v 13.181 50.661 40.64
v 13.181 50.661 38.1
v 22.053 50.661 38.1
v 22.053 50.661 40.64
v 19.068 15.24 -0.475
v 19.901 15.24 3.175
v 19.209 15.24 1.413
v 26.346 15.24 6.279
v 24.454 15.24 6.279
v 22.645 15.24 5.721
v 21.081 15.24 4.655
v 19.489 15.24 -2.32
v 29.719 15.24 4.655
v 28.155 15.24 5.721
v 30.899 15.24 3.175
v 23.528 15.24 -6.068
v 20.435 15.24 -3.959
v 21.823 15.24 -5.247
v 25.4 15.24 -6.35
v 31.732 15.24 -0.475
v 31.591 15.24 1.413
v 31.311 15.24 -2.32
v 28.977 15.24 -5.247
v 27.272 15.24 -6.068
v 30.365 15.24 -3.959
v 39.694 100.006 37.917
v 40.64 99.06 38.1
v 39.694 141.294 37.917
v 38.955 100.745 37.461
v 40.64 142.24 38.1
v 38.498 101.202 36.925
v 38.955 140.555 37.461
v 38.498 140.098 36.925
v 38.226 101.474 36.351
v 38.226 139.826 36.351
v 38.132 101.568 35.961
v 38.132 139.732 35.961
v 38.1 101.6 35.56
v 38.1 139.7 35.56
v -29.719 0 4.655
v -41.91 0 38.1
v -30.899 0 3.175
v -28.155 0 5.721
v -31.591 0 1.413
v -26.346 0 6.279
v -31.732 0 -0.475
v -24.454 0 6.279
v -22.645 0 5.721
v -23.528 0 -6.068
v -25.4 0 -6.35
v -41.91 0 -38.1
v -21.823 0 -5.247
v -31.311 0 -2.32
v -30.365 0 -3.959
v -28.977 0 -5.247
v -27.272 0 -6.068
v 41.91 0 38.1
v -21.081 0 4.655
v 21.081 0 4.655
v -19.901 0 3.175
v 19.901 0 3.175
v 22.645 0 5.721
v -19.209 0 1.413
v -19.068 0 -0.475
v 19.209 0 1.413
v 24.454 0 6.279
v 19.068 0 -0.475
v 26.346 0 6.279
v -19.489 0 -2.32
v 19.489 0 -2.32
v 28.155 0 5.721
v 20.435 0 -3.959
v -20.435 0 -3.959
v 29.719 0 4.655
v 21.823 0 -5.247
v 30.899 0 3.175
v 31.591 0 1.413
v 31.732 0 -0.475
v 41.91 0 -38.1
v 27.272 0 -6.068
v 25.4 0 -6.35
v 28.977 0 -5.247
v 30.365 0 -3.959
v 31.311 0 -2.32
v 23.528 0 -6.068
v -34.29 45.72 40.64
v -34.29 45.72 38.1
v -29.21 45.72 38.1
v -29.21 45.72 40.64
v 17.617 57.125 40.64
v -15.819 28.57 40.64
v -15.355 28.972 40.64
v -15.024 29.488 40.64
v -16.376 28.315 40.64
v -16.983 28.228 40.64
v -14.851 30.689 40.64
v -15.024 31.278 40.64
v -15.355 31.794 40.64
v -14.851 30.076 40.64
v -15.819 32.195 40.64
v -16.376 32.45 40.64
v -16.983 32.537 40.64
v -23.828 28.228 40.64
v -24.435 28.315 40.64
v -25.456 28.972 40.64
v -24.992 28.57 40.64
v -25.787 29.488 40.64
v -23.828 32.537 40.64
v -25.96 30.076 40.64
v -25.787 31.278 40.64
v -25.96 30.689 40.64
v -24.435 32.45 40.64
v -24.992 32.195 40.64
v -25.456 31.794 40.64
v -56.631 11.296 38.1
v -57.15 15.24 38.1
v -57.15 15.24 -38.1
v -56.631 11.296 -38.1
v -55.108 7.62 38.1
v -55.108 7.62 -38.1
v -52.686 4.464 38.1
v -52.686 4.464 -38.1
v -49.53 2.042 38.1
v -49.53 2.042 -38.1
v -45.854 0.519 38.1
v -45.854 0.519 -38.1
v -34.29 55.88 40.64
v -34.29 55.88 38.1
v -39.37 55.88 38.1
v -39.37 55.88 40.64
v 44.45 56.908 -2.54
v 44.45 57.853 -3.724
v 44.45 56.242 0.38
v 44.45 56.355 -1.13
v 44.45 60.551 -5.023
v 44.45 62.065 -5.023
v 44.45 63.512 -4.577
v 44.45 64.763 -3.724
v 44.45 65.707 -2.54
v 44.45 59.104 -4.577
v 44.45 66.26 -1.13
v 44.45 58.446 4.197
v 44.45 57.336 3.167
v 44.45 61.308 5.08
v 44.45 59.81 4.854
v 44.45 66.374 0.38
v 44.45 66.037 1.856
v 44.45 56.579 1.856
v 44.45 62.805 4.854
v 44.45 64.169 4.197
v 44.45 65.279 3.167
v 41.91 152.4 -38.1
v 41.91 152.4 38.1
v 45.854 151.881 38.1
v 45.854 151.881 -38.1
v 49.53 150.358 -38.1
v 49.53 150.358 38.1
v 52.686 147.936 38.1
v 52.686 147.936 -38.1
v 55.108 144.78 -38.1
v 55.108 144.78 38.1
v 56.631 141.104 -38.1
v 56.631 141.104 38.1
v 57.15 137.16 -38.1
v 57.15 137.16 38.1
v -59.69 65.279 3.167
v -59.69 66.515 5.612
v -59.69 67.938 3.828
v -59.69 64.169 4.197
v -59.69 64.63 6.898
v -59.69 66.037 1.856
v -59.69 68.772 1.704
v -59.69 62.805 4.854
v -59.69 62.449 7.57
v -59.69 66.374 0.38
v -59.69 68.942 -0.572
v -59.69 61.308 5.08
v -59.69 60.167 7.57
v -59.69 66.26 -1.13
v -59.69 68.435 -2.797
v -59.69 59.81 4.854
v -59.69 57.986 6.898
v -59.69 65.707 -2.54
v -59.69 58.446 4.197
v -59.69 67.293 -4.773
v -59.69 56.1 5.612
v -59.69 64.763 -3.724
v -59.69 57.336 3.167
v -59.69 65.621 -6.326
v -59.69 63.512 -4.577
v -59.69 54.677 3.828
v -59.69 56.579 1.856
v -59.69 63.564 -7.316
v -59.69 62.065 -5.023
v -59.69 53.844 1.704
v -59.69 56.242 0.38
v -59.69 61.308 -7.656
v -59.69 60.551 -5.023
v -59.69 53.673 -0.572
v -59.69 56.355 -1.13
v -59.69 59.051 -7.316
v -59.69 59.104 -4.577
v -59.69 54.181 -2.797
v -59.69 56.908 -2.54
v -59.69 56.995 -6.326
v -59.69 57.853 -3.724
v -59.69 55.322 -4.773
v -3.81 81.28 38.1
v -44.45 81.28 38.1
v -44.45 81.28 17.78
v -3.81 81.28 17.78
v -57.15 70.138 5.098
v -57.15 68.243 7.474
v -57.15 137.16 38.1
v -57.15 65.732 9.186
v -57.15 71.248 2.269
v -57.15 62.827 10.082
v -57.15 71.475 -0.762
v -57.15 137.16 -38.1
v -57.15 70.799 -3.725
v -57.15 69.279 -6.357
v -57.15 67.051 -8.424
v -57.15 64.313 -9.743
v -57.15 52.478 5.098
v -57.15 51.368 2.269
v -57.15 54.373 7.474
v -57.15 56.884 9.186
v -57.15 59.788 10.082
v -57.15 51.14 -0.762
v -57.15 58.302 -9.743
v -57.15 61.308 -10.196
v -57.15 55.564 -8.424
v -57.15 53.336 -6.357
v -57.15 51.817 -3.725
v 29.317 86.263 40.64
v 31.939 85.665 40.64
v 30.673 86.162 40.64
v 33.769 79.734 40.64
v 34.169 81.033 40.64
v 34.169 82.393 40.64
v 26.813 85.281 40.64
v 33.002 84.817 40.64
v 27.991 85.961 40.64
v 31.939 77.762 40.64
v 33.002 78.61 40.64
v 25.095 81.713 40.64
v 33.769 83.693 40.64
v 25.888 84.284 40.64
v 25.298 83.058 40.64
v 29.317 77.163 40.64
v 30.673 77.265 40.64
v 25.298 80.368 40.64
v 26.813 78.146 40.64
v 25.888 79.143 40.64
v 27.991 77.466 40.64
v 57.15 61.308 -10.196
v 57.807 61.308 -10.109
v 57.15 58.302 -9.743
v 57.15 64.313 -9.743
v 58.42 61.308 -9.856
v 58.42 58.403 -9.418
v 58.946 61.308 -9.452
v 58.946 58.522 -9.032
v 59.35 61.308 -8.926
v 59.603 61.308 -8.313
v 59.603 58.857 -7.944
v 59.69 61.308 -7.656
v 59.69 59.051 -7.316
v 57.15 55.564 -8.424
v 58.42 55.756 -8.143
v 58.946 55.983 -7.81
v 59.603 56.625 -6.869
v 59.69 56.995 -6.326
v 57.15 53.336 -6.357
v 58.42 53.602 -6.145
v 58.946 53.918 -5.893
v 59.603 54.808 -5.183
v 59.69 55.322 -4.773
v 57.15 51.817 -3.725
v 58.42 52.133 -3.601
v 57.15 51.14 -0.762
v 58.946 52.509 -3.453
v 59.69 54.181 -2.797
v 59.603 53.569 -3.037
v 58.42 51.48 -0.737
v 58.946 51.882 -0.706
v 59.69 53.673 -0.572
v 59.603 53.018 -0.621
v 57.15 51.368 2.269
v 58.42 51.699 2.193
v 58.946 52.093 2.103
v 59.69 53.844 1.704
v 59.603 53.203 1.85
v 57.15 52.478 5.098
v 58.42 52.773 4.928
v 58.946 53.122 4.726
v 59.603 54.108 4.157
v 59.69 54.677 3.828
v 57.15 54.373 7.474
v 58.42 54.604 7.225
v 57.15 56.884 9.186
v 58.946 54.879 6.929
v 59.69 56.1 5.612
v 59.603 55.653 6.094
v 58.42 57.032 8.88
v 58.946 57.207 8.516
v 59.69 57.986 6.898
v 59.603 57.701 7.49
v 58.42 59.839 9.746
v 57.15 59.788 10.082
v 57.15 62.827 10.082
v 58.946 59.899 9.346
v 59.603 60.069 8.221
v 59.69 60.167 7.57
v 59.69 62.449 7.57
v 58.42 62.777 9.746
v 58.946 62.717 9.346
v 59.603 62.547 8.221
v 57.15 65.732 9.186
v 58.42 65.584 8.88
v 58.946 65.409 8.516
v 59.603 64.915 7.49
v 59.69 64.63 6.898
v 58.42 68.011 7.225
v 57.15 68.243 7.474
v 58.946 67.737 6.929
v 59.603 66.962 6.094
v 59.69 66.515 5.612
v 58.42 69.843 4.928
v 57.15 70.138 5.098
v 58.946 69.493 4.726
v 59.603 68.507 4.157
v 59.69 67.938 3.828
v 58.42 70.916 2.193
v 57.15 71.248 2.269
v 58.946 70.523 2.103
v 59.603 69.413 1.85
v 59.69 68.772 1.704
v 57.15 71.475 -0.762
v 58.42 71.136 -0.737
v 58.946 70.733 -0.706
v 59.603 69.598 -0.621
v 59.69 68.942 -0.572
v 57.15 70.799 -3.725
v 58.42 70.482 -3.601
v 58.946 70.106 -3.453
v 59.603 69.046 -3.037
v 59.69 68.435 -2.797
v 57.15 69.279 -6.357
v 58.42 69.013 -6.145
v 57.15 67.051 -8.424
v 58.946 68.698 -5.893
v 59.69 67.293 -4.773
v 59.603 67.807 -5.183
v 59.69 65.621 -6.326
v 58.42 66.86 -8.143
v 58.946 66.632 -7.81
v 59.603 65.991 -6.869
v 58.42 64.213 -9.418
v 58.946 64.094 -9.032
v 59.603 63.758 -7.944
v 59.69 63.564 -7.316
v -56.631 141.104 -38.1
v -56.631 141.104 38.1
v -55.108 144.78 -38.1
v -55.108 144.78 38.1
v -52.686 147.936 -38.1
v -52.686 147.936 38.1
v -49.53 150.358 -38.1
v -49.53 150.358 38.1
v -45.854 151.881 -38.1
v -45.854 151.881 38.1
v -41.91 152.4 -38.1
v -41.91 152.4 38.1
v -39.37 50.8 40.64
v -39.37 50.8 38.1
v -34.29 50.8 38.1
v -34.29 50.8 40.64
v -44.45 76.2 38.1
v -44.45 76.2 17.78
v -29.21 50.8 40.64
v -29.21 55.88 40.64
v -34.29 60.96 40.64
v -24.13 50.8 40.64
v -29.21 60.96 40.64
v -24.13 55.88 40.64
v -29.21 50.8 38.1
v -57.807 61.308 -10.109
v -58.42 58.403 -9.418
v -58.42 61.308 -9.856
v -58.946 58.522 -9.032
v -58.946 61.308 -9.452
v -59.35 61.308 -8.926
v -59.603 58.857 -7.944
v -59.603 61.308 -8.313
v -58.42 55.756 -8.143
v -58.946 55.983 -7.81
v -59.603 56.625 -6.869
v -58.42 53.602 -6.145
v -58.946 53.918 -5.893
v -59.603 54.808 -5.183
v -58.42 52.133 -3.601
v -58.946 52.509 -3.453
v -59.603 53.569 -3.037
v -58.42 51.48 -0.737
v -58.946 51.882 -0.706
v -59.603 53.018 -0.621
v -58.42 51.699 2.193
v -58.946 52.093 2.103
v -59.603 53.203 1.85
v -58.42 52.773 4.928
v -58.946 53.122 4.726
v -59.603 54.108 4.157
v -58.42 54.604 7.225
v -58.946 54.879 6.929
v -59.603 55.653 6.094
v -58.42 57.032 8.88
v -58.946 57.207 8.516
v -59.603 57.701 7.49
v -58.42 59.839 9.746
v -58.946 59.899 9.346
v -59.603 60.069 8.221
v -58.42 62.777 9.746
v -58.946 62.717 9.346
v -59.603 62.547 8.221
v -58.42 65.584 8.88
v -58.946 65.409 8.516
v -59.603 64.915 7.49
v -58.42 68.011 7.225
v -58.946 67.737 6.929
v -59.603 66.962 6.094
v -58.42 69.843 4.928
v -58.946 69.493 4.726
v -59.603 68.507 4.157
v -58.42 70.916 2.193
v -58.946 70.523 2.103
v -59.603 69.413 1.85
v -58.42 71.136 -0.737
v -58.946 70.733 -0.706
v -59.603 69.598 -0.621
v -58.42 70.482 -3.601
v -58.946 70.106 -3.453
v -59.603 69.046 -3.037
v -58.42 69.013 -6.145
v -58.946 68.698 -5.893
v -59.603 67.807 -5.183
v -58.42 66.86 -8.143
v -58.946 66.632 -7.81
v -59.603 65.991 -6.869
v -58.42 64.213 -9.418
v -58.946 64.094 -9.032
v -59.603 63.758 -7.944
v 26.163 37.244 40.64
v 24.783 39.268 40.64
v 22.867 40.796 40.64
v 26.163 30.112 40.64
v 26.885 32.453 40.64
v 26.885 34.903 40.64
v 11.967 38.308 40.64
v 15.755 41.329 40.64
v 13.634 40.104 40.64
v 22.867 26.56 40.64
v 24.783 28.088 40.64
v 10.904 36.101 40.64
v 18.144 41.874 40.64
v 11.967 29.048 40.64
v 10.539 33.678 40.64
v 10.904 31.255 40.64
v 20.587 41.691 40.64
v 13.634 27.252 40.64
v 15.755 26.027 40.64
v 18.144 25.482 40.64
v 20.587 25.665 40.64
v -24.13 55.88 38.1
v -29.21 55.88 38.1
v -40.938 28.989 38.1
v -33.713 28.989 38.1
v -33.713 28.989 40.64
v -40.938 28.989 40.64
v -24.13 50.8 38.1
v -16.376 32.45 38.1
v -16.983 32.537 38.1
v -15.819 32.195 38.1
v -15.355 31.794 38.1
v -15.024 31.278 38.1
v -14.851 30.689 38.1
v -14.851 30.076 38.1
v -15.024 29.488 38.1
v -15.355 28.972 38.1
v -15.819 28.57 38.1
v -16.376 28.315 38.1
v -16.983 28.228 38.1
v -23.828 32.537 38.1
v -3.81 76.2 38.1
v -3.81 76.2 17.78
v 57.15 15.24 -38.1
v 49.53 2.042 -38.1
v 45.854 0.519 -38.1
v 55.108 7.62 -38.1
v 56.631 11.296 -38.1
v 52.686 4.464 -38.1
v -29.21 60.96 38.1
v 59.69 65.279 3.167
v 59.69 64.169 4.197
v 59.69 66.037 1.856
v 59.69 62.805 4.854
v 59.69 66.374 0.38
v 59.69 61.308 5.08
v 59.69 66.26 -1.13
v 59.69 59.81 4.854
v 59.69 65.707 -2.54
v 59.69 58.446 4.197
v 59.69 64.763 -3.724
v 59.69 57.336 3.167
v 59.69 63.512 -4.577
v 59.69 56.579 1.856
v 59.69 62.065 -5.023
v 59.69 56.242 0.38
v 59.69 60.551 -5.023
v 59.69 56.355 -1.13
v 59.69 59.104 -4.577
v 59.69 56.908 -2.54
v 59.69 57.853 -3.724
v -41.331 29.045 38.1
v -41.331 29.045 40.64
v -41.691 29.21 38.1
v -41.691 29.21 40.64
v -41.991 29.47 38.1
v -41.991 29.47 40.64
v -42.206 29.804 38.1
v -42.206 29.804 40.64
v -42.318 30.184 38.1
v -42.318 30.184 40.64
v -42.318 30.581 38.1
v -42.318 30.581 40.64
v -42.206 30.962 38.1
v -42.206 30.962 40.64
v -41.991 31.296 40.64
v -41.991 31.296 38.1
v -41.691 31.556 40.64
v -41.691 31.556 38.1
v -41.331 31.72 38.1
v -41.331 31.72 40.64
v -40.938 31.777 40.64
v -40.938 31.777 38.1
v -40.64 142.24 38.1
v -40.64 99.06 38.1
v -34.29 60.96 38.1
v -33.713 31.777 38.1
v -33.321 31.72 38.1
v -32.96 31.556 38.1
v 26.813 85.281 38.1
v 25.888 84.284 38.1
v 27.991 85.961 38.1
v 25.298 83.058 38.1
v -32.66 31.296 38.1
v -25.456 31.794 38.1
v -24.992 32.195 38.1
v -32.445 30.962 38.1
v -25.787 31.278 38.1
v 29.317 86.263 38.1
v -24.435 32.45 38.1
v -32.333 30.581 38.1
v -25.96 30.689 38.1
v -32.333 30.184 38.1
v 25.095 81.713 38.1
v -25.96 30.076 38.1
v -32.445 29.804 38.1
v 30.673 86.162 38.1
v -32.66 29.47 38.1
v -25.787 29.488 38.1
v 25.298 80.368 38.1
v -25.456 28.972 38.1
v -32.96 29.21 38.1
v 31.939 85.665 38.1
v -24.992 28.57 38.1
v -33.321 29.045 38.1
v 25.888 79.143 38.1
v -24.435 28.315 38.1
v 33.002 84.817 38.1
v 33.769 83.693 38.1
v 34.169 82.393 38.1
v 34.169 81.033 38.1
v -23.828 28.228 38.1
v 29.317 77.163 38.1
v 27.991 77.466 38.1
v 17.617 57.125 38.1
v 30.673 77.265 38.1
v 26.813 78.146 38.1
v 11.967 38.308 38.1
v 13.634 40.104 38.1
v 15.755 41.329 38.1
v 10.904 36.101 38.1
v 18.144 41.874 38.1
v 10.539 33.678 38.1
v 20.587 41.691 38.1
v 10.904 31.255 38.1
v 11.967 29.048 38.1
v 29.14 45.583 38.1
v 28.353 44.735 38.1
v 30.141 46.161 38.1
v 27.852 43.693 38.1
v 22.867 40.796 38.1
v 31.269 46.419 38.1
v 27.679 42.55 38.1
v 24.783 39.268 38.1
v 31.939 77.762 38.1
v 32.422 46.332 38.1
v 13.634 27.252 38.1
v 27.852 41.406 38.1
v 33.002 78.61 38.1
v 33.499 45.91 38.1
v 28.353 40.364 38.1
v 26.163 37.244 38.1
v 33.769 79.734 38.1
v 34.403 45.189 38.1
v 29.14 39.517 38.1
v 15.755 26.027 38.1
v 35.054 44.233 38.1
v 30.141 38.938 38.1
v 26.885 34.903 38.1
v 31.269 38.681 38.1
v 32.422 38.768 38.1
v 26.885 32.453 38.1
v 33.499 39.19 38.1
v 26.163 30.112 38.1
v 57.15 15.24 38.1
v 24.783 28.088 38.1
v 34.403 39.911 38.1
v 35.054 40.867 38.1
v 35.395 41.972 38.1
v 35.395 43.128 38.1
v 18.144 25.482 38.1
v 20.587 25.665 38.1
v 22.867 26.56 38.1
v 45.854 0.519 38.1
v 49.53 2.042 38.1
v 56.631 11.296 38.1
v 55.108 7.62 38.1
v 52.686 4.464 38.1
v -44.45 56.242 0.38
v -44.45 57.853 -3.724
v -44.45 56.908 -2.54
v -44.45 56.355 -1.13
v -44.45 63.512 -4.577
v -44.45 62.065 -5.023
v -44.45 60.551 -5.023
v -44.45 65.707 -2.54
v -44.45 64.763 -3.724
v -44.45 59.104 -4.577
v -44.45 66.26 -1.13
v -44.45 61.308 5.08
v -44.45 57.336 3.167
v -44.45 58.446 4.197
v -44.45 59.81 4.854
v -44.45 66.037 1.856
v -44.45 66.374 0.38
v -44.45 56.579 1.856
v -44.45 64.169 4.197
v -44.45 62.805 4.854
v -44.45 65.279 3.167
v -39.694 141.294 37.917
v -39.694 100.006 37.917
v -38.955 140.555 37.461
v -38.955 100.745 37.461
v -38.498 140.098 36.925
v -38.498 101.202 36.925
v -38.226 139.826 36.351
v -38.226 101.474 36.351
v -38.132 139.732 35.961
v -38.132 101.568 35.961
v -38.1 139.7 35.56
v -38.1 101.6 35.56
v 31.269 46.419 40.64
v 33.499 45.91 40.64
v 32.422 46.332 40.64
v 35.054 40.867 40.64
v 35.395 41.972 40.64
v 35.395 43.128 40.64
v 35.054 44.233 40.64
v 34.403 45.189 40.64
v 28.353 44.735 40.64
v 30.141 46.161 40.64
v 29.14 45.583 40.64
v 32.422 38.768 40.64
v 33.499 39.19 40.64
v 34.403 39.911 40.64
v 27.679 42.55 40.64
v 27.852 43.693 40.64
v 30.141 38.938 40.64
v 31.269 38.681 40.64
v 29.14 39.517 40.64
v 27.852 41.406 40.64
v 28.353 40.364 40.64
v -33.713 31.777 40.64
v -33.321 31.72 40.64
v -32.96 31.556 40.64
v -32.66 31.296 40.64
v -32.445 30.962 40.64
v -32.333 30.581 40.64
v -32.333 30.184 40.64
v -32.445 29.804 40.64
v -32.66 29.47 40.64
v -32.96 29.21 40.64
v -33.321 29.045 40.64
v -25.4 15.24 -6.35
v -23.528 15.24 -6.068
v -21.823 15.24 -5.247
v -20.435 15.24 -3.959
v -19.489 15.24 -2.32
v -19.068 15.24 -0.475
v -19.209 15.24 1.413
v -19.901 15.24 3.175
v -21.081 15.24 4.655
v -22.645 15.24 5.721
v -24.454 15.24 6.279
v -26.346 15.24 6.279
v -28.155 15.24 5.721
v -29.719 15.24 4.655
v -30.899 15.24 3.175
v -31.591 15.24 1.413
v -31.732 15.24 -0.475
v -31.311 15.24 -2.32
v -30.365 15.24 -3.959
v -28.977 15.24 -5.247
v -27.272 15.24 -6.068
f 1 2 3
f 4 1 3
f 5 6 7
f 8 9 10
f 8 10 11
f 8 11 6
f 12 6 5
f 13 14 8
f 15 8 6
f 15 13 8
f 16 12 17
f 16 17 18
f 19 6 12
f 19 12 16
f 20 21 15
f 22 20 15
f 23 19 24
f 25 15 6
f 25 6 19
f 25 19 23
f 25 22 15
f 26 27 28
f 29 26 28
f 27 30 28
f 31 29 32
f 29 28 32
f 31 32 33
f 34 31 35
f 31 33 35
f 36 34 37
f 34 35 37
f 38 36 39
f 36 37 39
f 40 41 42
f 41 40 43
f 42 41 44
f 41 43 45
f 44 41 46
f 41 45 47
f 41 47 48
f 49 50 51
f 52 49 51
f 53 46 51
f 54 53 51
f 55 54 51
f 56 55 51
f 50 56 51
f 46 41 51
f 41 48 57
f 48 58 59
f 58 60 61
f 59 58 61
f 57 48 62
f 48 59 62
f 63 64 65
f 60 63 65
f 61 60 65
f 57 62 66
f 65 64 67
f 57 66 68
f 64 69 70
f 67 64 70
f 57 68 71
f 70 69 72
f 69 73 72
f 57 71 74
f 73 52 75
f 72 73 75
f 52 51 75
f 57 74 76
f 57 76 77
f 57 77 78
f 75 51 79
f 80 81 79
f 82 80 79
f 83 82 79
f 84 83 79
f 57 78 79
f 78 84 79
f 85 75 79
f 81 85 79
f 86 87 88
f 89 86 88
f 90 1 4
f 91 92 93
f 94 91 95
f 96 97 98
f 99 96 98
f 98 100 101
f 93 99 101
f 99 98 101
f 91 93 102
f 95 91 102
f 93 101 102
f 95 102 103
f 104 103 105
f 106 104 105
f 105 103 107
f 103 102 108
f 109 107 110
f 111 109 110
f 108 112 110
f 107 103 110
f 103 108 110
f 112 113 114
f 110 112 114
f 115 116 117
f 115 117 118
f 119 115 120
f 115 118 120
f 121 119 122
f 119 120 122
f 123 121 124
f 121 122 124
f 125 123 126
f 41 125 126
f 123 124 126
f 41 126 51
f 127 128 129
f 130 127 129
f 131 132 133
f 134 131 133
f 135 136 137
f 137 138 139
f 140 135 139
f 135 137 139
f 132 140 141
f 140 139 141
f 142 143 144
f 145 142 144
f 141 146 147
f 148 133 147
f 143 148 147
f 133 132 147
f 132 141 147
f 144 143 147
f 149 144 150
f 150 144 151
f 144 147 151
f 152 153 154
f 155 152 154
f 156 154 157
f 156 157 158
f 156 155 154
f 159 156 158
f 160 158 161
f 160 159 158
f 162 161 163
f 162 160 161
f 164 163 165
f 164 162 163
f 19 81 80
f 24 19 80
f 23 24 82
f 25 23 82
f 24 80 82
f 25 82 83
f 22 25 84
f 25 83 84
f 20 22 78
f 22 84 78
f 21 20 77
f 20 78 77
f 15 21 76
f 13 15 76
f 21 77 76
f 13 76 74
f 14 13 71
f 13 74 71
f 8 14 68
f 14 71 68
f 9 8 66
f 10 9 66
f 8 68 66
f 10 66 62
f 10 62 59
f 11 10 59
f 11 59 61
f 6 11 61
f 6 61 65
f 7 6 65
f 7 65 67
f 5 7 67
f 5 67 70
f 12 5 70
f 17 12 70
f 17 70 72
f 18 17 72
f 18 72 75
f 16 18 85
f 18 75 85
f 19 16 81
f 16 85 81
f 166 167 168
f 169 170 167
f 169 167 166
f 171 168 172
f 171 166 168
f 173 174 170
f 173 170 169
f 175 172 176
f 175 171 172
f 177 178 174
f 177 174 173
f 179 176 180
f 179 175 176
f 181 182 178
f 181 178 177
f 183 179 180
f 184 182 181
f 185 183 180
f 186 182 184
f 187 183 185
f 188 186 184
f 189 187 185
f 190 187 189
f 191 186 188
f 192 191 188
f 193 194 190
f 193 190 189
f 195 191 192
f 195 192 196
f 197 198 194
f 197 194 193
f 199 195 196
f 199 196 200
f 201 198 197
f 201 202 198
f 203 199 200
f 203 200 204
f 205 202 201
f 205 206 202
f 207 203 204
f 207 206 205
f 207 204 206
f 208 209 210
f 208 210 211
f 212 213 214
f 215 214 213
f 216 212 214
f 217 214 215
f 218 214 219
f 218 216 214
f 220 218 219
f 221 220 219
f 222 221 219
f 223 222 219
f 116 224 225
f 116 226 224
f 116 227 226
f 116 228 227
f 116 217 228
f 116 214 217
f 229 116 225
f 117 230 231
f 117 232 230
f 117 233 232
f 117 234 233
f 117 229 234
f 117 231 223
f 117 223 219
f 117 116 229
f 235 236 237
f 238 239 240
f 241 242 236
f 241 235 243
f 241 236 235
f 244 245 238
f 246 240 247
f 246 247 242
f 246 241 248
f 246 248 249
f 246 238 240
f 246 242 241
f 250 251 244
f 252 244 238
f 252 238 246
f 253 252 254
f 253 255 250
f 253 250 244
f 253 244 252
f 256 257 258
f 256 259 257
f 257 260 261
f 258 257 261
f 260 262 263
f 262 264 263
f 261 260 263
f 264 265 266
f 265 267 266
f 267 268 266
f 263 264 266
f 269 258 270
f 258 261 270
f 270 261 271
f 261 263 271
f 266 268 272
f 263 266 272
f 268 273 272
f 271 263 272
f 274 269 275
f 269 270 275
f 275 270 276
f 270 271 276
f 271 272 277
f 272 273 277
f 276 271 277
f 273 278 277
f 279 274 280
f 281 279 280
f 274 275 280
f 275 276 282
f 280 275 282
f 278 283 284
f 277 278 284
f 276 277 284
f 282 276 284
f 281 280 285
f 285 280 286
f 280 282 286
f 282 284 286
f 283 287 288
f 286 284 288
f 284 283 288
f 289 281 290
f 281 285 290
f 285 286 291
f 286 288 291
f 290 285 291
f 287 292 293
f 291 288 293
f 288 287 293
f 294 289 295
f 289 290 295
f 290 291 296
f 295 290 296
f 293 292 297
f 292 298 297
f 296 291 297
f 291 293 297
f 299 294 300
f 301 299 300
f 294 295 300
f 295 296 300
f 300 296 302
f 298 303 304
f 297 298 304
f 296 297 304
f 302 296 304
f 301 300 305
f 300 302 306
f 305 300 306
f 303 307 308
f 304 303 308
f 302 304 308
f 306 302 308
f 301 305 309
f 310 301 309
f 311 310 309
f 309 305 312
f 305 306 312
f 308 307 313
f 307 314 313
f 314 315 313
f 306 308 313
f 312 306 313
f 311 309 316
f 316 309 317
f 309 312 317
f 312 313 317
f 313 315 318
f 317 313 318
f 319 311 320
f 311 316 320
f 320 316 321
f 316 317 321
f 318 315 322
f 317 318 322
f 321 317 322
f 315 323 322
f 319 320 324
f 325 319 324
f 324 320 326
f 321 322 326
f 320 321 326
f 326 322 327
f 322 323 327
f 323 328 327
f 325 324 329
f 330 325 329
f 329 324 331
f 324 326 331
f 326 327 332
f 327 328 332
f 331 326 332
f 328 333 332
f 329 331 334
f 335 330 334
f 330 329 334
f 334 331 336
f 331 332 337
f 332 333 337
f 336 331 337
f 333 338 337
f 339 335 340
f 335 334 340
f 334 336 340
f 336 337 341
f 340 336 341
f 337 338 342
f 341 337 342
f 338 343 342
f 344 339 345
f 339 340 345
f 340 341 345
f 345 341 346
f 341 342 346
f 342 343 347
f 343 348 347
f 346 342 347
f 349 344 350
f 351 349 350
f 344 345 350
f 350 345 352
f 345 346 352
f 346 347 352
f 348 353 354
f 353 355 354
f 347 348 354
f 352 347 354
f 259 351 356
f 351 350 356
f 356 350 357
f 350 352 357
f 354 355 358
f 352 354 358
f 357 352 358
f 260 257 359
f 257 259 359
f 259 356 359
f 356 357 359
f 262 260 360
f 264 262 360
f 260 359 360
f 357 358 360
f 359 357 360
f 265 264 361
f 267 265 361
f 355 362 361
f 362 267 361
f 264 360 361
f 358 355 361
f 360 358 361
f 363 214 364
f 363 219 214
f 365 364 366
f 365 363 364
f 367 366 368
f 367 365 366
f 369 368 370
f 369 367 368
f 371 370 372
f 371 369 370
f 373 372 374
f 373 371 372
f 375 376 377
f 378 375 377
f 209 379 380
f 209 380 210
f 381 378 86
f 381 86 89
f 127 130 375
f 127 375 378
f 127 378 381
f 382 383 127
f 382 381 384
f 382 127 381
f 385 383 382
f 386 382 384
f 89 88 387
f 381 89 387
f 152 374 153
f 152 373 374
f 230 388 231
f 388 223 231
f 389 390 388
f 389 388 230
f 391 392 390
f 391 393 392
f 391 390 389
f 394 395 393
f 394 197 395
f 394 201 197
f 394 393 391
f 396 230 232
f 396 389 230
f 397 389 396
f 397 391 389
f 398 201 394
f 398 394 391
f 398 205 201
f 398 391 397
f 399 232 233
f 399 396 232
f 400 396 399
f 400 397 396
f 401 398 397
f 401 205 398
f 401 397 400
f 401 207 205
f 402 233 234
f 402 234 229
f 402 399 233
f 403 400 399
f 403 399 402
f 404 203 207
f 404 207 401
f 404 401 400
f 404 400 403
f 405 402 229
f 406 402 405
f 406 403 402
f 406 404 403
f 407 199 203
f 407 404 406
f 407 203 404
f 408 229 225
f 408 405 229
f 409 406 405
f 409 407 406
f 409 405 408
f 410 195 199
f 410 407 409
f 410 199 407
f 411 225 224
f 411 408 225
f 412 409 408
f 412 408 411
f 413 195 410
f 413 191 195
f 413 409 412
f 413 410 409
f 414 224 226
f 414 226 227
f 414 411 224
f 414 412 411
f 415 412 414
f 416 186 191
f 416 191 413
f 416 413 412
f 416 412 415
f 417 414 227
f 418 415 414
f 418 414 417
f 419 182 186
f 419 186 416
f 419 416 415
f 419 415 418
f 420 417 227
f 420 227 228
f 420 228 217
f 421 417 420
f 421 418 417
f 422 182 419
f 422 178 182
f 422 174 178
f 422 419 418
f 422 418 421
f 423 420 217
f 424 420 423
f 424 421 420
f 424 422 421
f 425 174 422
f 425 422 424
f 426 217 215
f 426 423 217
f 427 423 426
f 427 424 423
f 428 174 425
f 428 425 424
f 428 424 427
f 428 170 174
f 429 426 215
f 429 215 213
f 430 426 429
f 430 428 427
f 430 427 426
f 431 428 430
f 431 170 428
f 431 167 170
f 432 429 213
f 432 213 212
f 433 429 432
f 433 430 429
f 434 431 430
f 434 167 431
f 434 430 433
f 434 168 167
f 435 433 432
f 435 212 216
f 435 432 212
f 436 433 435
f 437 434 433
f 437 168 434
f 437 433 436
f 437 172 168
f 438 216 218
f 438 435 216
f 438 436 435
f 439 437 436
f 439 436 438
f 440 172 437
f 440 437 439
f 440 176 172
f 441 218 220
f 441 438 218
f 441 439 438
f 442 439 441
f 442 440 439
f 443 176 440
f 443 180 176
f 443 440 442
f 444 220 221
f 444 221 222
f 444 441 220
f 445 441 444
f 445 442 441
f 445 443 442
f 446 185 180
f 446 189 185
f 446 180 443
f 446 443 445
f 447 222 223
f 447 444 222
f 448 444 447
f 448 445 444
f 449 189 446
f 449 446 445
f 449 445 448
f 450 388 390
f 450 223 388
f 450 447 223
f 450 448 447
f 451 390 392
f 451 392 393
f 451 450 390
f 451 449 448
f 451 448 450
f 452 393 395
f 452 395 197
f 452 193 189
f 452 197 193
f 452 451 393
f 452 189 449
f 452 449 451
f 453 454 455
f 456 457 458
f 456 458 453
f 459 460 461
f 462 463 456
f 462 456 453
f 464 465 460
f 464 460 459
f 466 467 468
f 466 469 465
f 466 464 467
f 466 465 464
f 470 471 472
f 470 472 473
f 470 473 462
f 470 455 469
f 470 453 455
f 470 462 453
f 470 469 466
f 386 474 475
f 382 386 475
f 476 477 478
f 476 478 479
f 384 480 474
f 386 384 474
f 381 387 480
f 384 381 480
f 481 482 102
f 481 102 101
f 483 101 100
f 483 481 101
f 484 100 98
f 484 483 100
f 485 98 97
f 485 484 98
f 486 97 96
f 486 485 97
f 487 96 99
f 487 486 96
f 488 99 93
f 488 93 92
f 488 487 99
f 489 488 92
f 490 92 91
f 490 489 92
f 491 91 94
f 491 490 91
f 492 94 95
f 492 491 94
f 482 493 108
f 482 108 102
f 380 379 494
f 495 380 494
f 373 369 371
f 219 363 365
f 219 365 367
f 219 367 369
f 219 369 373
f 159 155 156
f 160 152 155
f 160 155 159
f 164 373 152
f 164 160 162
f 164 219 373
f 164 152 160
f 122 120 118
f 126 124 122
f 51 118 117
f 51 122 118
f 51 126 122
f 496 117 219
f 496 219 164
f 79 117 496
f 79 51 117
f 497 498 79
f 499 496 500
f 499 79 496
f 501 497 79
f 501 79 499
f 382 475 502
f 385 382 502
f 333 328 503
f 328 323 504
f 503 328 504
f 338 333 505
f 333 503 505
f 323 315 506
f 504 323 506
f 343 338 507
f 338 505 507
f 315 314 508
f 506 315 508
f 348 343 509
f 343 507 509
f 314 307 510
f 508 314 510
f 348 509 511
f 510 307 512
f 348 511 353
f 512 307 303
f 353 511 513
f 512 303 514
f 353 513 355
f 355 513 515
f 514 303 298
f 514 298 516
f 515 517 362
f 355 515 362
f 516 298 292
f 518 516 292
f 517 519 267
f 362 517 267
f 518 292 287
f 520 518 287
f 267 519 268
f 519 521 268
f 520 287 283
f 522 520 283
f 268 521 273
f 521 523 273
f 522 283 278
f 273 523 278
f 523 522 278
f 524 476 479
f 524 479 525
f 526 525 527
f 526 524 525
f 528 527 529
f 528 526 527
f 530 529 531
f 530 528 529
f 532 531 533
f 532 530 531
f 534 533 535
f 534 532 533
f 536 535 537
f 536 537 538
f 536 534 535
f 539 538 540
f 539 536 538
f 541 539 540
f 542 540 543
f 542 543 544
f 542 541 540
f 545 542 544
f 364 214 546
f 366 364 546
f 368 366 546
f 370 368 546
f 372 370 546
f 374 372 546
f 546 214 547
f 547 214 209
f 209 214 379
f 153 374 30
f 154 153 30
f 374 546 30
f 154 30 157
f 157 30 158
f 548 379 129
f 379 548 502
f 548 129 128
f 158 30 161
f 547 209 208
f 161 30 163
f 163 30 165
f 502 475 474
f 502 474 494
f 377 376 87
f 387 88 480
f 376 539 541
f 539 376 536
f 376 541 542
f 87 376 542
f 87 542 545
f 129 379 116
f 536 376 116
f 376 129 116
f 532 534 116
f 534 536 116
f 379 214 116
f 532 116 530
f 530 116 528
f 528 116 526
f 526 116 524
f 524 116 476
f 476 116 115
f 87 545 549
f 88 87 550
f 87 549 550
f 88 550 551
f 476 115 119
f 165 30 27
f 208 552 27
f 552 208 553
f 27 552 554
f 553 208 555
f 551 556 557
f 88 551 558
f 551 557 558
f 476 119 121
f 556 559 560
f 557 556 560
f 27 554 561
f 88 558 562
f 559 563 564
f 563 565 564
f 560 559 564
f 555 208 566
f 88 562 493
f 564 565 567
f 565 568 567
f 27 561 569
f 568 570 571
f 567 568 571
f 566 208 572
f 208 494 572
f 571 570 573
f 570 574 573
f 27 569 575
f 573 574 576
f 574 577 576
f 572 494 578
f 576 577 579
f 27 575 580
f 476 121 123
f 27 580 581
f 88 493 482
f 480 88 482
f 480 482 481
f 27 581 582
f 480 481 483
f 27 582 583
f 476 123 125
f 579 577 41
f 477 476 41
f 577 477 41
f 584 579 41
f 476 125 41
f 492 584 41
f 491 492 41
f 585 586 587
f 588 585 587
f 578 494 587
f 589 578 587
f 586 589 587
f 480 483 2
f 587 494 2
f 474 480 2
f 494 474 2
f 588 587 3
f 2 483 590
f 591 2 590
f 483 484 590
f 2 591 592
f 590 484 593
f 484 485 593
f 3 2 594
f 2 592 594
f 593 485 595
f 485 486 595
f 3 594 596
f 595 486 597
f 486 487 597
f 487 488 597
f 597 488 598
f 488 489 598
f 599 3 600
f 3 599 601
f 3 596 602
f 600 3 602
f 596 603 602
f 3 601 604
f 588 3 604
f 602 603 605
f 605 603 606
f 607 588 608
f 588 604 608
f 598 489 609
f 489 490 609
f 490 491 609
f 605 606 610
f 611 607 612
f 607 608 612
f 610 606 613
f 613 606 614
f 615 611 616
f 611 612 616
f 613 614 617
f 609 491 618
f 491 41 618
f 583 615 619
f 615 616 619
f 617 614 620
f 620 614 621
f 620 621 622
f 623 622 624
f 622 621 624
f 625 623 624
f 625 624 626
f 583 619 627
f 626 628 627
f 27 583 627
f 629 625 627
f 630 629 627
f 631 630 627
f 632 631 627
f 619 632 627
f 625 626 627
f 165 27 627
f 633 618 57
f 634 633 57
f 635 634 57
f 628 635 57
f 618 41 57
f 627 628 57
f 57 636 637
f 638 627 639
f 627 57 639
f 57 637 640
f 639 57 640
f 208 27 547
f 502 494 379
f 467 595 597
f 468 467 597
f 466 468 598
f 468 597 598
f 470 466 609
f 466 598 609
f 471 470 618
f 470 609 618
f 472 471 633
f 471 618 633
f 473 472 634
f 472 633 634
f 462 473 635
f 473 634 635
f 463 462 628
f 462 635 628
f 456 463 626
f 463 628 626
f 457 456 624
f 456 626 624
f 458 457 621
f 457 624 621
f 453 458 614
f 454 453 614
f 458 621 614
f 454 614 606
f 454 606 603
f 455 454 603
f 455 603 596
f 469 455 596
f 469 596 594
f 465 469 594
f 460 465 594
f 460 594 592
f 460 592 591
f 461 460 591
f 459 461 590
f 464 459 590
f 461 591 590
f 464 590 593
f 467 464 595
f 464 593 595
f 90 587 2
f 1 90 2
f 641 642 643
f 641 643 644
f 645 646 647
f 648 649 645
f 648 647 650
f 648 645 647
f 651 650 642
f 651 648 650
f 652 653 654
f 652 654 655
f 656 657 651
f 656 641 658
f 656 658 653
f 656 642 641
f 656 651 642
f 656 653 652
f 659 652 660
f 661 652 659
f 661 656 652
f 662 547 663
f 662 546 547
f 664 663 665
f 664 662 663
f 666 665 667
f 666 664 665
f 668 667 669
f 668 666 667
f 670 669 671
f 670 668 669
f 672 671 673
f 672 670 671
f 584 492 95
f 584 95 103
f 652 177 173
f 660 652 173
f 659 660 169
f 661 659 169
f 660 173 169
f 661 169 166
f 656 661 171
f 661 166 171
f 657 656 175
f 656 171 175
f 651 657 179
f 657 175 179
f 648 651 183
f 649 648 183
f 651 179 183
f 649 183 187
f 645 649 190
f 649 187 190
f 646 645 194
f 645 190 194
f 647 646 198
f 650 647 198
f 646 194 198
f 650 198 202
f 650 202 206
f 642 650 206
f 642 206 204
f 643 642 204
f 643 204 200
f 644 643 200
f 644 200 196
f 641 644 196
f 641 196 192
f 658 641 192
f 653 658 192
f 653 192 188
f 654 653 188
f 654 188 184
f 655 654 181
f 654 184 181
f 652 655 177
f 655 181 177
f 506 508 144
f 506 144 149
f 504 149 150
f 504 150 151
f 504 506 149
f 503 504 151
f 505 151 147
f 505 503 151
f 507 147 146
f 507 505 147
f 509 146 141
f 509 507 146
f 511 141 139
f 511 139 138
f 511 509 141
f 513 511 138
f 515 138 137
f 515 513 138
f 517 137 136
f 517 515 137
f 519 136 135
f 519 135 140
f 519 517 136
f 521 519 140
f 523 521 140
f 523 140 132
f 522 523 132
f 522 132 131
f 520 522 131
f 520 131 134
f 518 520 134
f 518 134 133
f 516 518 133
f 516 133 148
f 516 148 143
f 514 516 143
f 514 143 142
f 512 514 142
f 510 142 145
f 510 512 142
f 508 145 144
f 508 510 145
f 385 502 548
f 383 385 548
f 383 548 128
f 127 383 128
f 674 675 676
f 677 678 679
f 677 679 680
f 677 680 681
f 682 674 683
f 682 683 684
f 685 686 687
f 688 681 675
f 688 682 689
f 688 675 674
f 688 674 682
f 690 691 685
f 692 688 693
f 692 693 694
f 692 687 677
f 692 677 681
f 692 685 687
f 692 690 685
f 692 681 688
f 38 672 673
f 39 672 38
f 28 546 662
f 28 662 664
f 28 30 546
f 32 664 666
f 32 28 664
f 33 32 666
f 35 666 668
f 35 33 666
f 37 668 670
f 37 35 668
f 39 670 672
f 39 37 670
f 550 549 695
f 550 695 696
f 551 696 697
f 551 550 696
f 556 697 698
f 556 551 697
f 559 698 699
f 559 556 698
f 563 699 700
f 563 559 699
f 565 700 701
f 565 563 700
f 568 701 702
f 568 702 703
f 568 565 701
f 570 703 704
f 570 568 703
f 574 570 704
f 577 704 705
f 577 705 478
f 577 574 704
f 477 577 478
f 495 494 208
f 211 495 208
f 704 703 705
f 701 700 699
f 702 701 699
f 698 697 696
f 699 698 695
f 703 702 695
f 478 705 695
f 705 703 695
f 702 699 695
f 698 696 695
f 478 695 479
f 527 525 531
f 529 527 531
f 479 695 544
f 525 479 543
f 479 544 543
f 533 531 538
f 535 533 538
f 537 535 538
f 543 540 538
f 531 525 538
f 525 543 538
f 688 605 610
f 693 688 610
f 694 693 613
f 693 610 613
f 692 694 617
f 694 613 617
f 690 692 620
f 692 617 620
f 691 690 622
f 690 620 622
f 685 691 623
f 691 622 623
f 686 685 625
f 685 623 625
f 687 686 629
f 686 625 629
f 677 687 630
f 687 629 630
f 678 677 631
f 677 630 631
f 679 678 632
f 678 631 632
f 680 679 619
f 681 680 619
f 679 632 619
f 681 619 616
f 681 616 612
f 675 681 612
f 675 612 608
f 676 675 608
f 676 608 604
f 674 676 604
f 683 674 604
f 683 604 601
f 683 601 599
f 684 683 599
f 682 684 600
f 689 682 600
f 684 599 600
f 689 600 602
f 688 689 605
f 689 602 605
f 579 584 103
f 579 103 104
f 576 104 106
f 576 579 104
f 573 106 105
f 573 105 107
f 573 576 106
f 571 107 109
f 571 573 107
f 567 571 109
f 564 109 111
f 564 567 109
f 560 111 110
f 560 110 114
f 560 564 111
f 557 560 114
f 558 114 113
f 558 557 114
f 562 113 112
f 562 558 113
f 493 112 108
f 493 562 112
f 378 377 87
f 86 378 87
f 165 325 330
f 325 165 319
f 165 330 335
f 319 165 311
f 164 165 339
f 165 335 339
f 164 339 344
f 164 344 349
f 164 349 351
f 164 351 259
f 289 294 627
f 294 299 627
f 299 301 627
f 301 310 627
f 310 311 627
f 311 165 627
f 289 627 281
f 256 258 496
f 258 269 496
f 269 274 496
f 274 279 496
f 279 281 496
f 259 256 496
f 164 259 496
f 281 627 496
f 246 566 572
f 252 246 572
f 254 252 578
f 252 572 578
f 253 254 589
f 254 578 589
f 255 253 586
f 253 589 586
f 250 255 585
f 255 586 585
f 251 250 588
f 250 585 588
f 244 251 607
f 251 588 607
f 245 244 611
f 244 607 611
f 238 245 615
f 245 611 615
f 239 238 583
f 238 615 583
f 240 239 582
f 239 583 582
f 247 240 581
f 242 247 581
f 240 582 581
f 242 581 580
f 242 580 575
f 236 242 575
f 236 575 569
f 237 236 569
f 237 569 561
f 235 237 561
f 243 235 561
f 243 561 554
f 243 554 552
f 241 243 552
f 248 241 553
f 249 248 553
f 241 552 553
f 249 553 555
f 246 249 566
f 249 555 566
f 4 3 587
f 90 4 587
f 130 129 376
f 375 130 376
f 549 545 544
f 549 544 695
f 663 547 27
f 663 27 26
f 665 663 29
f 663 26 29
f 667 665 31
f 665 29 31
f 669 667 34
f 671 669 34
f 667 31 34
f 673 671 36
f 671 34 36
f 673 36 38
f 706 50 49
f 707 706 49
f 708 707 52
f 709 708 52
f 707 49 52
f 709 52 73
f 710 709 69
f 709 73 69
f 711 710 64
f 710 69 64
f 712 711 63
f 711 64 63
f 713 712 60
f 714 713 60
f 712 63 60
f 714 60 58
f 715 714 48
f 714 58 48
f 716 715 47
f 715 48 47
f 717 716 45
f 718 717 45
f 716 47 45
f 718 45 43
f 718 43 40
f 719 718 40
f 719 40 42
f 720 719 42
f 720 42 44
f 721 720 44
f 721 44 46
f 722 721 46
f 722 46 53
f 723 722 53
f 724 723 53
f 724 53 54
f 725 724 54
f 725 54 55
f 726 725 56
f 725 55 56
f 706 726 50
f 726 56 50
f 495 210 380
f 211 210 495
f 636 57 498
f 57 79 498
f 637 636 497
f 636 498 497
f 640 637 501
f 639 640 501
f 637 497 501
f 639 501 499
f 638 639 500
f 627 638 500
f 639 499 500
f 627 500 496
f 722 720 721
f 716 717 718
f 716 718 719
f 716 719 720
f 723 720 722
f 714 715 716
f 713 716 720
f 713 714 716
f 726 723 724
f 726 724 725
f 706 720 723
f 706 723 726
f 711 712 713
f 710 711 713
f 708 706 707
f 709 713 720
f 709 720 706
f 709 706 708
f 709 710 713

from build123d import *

# Parameters (mm, degrees)
SKETCH2_W           = 114.3
SKETCH2_H           = 76.2
BOSS_EXTRUDE1_DEPTH = 152.4
SKETCH3_W           = 76.2
SKETCH3_H           = 38.1
CUT_EXTRUDE1_DEPTH  = 2.54
FILLET2_R           = 15.24
SKETCH4_W           = 40.64
SKETCH4_H           = 5.08
CUT_EXTRUDE2_DEPTH  = 20.32
SKETCH5_R           = 4.562719015
BOSS_EXTRUDE2_DEPTH = 2.54
SKETCH11_R          = 10.195906114
BOSS_EXTRUDE3_DEPTH = 2.54
SKETCH12_R          = 5.08
CUT_EXTRUDE8_DEPTH  = 15.24
SKETCH13_R          = 6.35
CUT_EXTRUDE9_DEPTH  = 15.24
FILLET3_R           = 2.54
FILLET4_R           = 2.54
BOSS_EXTRUDE4_DEPTH = 2.54
BOSS_EXTRUDE5_DEPTH = 2.54
SKETCH8_R           = 3.879636345
BOSS_EXTRUDE6_DEPTH = 2.54
BOSS_EXTRUDE7_DEPTH = 2.54
SKETCH9_R           = 8.218720736
BOSS_EXTRUDE8_DEPTH = 2.54


with BuildPart() as part:
    # Sketch2 → Boss-Extrude1 (new body)
    with BuildSketch(Plane(origin=(0, 0, 0), x_dir=(1, 0, 0), z_dir=(0, 1, 0))):
        Rectangle(SKETCH2_W, SKETCH2_H)
    extrude(amount=BOSS_EXTRUDE1_DEPTH)

    # Sketch3 → Cut-Extrude1 (cut)
    with BuildSketch(Plane.XY.offset(38.1)):
        with Locations((0, 120.65)):
            Rectangle(SKETCH3_W, SKETCH3_H)
    extrude(amount=-CUT_EXTRUDE1_DEPTH, mode=Mode.SUBTRACT)

    # Fillet2
    fillet2_edges = [part.edges().sort_by_distance(p)[0] for p in [
        (-57.15, 152.4, 0),
        (57.15, 152.4, 0),
        (-57.15, 0, 0),
        (57.15, 0, 0),
    ]]
    fillet(fillet2_edges, radius=FILLET2_R)

    # Sketch4 → Cut-Extrude2 (cut)
    with BuildSketch(Plane.XY.offset(38.1)):
        with Locations((-24.13, 78.74)):
            Rectangle(SKETCH4_W, SKETCH4_H)
    extrude(amount=-CUT_EXTRUDE2_DEPTH, mode=Mode.SUBTRACT)

    # Sketch5 → Boss-Extrude2 (add)
    with BuildSketch(Plane.XY.offset(38.1)):
        with Locations(Location((29.657673596, 81.713285476, 0), (0, 0, 180))):
            Circle(SKETCH5_R)
    extrude(amount=BOSS_EXTRUDE2_DEPTH)

    # Sketch11 → Boss-Extrude3 (add)
    with BuildSketch(Plane.ZY.offset(57.15)):
        with Locations(Location((0, 61.307792105, 0), (0, 0, 180))):
            Circle(SKETCH11_R)
    boss_extrude3 = extrude(amount=BOSS_EXTRUDE3_DEPTH)

    # Sketch12 → Cut-Extrude8 (cut)
    with BuildSketch(Plane.ZY.offset(59.69)):
        with Locations((0, 61.307792105)):
            Circle(SKETCH12_R)
    cut_extrude8 = extrude(amount=-CUT_EXTRUDE8_DEPTH, mode=Mode.SUBTRACT)

    # Mirror1: Boss-Extrude3, Cut-Extrude8 across plane
    add(boss_extrude3.mirror(Plane(origin=(0, 0, 0), x_dir=(0, 0, 1), z_dir=(1, 0, 0))))
    add(cut_extrude8.mirror(Plane(origin=(0, 0, 0), x_dir=(0, 0, 1), z_dir=(1, 0, 0))), mode=Mode.SUBTRACT)

    # Sketch13 → Cut-Extrude9 (cut)
    with BuildSketch(Plane.XZ):
        with Locations(Location((-25.4, 0, 0), (0, 0, 270))):
            Circle(SKETCH13_R)
        with Locations(Location((25.4, 0, 0), (0, 0, 270))):
            Circle(SKETCH13_R)
    extrude(amount=-CUT_EXTRUDE9_DEPTH, mode=Mode.SUBTRACT)

    # Fillet3
    fillet3_edges = [part.edges().sort_by_distance(p)[0] for p in [
        (-59.69, 61.307792105, 10.195906114),
        (59.69, 61.307792105, 10.195906114),
    ]]
    fillet(fillet3_edges, radius=FILLET3_R - 0.0001)  # a hair under: the kernel refuses the full size

    # Fillet4
    fillet4_edges = [part.edges().sort_by_distance(p)[0] for p in [
        (0, 101.6, 38.1),
        (-38.1, 120.65, 38.1),
        (38.1, 120.65, 38.1),
        (0, 139.7, 38.1),
    ]]
    fillet(fillet4_edges, radius=FILLET4_R - 0.0001)  # a hair under: the kernel refuses the full size

    # Sketch6 → Boss-Extrude4 (add)
    with BuildSketch(Plane.XY.offset(38.1)):
        Polygon((-34.29, 60.96), (-34.29, 55.88), (-39.37, 55.88), (-39.37, 50.8), (-34.29, 50.8), (-34.29, 45.72), (-29.21, 45.72), (-29.21, 50.8), (-24.13, 50.8), (-24.13, 55.88), (-29.21, 55.88), (-29.21, 60.96), align=None)
    extrude(amount=BOSS_EXTRUDE4_DEPTH)

    # Sketch7 → Boss-Extrude5 (add)
    with BuildSketch(Plane.XY.offset(38.1)):
        Polygon((17.617165085, 57.125299675), (13.181188265, 50.661447737), (22.053141905, 50.661447737), align=None)
    extrude(amount=BOSS_EXTRUDE5_DEPTH)

    # Sketch8 → Boss-Extrude6 (add)
    with BuildSketch(Plane.XY.offset(38.1)):
        with Locations(Location((31.558806519, 42.549947266, 0), (0, 0, 180))):
            Circle(SKETCH8_R)
    extrude(amount=BOSS_EXTRUDE6_DEPTH)

    # Sketch10 → Boss-Extrude7 (add)
    with BuildSketch(Plane.XY.offset(38.1)):
        with BuildLine():
            Line((-40.937728938, 31.776860704), (-33.713423831, 31.776860704))
            ThreePointArc((-33.713423831, 31.776860704), (-32.319259688, 30.38269656), (-33.713423831, 28.988532417))
            Line((-33.713423831, 28.988532417), (-40.937728938, 28.988532417))
            ThreePointArc((-40.937728938, 28.988532417), (-42.331893081, 30.38269656), (-40.937728938, 31.776860704))
        make_face()
        with BuildLine():
            Line((-23.827532632, 32.537313873), (-16.98345411, 32.537313873))
            ThreePointArc((-16.98345411, 32.537313873), (-14.828836798, 30.38269656), (-16.98345411, 28.228079248))
            Line((-16.98345411, 28.228079248), (-23.827532632, 28.228079248))
            ThreePointArc((-23.827532632, 28.228079248), (-25.982149945, 30.38269656), (-23.827532632, 32.537313873))
        make_face()
    extrude(amount=BOSS_EXTRUDE7_DEPTH)

    # Sketch9 → Boss-Extrude8 (add)
    with BuildSketch(Plane.XY.offset(38.1)):
        with Locations(Location((18.757844838, 33.677993627, 0), (0, 0, 180))):
            Circle(SKETCH9_R)
    extrude(amount=BOSS_EXTRUDE8_DEPTH)


solid = part.part
